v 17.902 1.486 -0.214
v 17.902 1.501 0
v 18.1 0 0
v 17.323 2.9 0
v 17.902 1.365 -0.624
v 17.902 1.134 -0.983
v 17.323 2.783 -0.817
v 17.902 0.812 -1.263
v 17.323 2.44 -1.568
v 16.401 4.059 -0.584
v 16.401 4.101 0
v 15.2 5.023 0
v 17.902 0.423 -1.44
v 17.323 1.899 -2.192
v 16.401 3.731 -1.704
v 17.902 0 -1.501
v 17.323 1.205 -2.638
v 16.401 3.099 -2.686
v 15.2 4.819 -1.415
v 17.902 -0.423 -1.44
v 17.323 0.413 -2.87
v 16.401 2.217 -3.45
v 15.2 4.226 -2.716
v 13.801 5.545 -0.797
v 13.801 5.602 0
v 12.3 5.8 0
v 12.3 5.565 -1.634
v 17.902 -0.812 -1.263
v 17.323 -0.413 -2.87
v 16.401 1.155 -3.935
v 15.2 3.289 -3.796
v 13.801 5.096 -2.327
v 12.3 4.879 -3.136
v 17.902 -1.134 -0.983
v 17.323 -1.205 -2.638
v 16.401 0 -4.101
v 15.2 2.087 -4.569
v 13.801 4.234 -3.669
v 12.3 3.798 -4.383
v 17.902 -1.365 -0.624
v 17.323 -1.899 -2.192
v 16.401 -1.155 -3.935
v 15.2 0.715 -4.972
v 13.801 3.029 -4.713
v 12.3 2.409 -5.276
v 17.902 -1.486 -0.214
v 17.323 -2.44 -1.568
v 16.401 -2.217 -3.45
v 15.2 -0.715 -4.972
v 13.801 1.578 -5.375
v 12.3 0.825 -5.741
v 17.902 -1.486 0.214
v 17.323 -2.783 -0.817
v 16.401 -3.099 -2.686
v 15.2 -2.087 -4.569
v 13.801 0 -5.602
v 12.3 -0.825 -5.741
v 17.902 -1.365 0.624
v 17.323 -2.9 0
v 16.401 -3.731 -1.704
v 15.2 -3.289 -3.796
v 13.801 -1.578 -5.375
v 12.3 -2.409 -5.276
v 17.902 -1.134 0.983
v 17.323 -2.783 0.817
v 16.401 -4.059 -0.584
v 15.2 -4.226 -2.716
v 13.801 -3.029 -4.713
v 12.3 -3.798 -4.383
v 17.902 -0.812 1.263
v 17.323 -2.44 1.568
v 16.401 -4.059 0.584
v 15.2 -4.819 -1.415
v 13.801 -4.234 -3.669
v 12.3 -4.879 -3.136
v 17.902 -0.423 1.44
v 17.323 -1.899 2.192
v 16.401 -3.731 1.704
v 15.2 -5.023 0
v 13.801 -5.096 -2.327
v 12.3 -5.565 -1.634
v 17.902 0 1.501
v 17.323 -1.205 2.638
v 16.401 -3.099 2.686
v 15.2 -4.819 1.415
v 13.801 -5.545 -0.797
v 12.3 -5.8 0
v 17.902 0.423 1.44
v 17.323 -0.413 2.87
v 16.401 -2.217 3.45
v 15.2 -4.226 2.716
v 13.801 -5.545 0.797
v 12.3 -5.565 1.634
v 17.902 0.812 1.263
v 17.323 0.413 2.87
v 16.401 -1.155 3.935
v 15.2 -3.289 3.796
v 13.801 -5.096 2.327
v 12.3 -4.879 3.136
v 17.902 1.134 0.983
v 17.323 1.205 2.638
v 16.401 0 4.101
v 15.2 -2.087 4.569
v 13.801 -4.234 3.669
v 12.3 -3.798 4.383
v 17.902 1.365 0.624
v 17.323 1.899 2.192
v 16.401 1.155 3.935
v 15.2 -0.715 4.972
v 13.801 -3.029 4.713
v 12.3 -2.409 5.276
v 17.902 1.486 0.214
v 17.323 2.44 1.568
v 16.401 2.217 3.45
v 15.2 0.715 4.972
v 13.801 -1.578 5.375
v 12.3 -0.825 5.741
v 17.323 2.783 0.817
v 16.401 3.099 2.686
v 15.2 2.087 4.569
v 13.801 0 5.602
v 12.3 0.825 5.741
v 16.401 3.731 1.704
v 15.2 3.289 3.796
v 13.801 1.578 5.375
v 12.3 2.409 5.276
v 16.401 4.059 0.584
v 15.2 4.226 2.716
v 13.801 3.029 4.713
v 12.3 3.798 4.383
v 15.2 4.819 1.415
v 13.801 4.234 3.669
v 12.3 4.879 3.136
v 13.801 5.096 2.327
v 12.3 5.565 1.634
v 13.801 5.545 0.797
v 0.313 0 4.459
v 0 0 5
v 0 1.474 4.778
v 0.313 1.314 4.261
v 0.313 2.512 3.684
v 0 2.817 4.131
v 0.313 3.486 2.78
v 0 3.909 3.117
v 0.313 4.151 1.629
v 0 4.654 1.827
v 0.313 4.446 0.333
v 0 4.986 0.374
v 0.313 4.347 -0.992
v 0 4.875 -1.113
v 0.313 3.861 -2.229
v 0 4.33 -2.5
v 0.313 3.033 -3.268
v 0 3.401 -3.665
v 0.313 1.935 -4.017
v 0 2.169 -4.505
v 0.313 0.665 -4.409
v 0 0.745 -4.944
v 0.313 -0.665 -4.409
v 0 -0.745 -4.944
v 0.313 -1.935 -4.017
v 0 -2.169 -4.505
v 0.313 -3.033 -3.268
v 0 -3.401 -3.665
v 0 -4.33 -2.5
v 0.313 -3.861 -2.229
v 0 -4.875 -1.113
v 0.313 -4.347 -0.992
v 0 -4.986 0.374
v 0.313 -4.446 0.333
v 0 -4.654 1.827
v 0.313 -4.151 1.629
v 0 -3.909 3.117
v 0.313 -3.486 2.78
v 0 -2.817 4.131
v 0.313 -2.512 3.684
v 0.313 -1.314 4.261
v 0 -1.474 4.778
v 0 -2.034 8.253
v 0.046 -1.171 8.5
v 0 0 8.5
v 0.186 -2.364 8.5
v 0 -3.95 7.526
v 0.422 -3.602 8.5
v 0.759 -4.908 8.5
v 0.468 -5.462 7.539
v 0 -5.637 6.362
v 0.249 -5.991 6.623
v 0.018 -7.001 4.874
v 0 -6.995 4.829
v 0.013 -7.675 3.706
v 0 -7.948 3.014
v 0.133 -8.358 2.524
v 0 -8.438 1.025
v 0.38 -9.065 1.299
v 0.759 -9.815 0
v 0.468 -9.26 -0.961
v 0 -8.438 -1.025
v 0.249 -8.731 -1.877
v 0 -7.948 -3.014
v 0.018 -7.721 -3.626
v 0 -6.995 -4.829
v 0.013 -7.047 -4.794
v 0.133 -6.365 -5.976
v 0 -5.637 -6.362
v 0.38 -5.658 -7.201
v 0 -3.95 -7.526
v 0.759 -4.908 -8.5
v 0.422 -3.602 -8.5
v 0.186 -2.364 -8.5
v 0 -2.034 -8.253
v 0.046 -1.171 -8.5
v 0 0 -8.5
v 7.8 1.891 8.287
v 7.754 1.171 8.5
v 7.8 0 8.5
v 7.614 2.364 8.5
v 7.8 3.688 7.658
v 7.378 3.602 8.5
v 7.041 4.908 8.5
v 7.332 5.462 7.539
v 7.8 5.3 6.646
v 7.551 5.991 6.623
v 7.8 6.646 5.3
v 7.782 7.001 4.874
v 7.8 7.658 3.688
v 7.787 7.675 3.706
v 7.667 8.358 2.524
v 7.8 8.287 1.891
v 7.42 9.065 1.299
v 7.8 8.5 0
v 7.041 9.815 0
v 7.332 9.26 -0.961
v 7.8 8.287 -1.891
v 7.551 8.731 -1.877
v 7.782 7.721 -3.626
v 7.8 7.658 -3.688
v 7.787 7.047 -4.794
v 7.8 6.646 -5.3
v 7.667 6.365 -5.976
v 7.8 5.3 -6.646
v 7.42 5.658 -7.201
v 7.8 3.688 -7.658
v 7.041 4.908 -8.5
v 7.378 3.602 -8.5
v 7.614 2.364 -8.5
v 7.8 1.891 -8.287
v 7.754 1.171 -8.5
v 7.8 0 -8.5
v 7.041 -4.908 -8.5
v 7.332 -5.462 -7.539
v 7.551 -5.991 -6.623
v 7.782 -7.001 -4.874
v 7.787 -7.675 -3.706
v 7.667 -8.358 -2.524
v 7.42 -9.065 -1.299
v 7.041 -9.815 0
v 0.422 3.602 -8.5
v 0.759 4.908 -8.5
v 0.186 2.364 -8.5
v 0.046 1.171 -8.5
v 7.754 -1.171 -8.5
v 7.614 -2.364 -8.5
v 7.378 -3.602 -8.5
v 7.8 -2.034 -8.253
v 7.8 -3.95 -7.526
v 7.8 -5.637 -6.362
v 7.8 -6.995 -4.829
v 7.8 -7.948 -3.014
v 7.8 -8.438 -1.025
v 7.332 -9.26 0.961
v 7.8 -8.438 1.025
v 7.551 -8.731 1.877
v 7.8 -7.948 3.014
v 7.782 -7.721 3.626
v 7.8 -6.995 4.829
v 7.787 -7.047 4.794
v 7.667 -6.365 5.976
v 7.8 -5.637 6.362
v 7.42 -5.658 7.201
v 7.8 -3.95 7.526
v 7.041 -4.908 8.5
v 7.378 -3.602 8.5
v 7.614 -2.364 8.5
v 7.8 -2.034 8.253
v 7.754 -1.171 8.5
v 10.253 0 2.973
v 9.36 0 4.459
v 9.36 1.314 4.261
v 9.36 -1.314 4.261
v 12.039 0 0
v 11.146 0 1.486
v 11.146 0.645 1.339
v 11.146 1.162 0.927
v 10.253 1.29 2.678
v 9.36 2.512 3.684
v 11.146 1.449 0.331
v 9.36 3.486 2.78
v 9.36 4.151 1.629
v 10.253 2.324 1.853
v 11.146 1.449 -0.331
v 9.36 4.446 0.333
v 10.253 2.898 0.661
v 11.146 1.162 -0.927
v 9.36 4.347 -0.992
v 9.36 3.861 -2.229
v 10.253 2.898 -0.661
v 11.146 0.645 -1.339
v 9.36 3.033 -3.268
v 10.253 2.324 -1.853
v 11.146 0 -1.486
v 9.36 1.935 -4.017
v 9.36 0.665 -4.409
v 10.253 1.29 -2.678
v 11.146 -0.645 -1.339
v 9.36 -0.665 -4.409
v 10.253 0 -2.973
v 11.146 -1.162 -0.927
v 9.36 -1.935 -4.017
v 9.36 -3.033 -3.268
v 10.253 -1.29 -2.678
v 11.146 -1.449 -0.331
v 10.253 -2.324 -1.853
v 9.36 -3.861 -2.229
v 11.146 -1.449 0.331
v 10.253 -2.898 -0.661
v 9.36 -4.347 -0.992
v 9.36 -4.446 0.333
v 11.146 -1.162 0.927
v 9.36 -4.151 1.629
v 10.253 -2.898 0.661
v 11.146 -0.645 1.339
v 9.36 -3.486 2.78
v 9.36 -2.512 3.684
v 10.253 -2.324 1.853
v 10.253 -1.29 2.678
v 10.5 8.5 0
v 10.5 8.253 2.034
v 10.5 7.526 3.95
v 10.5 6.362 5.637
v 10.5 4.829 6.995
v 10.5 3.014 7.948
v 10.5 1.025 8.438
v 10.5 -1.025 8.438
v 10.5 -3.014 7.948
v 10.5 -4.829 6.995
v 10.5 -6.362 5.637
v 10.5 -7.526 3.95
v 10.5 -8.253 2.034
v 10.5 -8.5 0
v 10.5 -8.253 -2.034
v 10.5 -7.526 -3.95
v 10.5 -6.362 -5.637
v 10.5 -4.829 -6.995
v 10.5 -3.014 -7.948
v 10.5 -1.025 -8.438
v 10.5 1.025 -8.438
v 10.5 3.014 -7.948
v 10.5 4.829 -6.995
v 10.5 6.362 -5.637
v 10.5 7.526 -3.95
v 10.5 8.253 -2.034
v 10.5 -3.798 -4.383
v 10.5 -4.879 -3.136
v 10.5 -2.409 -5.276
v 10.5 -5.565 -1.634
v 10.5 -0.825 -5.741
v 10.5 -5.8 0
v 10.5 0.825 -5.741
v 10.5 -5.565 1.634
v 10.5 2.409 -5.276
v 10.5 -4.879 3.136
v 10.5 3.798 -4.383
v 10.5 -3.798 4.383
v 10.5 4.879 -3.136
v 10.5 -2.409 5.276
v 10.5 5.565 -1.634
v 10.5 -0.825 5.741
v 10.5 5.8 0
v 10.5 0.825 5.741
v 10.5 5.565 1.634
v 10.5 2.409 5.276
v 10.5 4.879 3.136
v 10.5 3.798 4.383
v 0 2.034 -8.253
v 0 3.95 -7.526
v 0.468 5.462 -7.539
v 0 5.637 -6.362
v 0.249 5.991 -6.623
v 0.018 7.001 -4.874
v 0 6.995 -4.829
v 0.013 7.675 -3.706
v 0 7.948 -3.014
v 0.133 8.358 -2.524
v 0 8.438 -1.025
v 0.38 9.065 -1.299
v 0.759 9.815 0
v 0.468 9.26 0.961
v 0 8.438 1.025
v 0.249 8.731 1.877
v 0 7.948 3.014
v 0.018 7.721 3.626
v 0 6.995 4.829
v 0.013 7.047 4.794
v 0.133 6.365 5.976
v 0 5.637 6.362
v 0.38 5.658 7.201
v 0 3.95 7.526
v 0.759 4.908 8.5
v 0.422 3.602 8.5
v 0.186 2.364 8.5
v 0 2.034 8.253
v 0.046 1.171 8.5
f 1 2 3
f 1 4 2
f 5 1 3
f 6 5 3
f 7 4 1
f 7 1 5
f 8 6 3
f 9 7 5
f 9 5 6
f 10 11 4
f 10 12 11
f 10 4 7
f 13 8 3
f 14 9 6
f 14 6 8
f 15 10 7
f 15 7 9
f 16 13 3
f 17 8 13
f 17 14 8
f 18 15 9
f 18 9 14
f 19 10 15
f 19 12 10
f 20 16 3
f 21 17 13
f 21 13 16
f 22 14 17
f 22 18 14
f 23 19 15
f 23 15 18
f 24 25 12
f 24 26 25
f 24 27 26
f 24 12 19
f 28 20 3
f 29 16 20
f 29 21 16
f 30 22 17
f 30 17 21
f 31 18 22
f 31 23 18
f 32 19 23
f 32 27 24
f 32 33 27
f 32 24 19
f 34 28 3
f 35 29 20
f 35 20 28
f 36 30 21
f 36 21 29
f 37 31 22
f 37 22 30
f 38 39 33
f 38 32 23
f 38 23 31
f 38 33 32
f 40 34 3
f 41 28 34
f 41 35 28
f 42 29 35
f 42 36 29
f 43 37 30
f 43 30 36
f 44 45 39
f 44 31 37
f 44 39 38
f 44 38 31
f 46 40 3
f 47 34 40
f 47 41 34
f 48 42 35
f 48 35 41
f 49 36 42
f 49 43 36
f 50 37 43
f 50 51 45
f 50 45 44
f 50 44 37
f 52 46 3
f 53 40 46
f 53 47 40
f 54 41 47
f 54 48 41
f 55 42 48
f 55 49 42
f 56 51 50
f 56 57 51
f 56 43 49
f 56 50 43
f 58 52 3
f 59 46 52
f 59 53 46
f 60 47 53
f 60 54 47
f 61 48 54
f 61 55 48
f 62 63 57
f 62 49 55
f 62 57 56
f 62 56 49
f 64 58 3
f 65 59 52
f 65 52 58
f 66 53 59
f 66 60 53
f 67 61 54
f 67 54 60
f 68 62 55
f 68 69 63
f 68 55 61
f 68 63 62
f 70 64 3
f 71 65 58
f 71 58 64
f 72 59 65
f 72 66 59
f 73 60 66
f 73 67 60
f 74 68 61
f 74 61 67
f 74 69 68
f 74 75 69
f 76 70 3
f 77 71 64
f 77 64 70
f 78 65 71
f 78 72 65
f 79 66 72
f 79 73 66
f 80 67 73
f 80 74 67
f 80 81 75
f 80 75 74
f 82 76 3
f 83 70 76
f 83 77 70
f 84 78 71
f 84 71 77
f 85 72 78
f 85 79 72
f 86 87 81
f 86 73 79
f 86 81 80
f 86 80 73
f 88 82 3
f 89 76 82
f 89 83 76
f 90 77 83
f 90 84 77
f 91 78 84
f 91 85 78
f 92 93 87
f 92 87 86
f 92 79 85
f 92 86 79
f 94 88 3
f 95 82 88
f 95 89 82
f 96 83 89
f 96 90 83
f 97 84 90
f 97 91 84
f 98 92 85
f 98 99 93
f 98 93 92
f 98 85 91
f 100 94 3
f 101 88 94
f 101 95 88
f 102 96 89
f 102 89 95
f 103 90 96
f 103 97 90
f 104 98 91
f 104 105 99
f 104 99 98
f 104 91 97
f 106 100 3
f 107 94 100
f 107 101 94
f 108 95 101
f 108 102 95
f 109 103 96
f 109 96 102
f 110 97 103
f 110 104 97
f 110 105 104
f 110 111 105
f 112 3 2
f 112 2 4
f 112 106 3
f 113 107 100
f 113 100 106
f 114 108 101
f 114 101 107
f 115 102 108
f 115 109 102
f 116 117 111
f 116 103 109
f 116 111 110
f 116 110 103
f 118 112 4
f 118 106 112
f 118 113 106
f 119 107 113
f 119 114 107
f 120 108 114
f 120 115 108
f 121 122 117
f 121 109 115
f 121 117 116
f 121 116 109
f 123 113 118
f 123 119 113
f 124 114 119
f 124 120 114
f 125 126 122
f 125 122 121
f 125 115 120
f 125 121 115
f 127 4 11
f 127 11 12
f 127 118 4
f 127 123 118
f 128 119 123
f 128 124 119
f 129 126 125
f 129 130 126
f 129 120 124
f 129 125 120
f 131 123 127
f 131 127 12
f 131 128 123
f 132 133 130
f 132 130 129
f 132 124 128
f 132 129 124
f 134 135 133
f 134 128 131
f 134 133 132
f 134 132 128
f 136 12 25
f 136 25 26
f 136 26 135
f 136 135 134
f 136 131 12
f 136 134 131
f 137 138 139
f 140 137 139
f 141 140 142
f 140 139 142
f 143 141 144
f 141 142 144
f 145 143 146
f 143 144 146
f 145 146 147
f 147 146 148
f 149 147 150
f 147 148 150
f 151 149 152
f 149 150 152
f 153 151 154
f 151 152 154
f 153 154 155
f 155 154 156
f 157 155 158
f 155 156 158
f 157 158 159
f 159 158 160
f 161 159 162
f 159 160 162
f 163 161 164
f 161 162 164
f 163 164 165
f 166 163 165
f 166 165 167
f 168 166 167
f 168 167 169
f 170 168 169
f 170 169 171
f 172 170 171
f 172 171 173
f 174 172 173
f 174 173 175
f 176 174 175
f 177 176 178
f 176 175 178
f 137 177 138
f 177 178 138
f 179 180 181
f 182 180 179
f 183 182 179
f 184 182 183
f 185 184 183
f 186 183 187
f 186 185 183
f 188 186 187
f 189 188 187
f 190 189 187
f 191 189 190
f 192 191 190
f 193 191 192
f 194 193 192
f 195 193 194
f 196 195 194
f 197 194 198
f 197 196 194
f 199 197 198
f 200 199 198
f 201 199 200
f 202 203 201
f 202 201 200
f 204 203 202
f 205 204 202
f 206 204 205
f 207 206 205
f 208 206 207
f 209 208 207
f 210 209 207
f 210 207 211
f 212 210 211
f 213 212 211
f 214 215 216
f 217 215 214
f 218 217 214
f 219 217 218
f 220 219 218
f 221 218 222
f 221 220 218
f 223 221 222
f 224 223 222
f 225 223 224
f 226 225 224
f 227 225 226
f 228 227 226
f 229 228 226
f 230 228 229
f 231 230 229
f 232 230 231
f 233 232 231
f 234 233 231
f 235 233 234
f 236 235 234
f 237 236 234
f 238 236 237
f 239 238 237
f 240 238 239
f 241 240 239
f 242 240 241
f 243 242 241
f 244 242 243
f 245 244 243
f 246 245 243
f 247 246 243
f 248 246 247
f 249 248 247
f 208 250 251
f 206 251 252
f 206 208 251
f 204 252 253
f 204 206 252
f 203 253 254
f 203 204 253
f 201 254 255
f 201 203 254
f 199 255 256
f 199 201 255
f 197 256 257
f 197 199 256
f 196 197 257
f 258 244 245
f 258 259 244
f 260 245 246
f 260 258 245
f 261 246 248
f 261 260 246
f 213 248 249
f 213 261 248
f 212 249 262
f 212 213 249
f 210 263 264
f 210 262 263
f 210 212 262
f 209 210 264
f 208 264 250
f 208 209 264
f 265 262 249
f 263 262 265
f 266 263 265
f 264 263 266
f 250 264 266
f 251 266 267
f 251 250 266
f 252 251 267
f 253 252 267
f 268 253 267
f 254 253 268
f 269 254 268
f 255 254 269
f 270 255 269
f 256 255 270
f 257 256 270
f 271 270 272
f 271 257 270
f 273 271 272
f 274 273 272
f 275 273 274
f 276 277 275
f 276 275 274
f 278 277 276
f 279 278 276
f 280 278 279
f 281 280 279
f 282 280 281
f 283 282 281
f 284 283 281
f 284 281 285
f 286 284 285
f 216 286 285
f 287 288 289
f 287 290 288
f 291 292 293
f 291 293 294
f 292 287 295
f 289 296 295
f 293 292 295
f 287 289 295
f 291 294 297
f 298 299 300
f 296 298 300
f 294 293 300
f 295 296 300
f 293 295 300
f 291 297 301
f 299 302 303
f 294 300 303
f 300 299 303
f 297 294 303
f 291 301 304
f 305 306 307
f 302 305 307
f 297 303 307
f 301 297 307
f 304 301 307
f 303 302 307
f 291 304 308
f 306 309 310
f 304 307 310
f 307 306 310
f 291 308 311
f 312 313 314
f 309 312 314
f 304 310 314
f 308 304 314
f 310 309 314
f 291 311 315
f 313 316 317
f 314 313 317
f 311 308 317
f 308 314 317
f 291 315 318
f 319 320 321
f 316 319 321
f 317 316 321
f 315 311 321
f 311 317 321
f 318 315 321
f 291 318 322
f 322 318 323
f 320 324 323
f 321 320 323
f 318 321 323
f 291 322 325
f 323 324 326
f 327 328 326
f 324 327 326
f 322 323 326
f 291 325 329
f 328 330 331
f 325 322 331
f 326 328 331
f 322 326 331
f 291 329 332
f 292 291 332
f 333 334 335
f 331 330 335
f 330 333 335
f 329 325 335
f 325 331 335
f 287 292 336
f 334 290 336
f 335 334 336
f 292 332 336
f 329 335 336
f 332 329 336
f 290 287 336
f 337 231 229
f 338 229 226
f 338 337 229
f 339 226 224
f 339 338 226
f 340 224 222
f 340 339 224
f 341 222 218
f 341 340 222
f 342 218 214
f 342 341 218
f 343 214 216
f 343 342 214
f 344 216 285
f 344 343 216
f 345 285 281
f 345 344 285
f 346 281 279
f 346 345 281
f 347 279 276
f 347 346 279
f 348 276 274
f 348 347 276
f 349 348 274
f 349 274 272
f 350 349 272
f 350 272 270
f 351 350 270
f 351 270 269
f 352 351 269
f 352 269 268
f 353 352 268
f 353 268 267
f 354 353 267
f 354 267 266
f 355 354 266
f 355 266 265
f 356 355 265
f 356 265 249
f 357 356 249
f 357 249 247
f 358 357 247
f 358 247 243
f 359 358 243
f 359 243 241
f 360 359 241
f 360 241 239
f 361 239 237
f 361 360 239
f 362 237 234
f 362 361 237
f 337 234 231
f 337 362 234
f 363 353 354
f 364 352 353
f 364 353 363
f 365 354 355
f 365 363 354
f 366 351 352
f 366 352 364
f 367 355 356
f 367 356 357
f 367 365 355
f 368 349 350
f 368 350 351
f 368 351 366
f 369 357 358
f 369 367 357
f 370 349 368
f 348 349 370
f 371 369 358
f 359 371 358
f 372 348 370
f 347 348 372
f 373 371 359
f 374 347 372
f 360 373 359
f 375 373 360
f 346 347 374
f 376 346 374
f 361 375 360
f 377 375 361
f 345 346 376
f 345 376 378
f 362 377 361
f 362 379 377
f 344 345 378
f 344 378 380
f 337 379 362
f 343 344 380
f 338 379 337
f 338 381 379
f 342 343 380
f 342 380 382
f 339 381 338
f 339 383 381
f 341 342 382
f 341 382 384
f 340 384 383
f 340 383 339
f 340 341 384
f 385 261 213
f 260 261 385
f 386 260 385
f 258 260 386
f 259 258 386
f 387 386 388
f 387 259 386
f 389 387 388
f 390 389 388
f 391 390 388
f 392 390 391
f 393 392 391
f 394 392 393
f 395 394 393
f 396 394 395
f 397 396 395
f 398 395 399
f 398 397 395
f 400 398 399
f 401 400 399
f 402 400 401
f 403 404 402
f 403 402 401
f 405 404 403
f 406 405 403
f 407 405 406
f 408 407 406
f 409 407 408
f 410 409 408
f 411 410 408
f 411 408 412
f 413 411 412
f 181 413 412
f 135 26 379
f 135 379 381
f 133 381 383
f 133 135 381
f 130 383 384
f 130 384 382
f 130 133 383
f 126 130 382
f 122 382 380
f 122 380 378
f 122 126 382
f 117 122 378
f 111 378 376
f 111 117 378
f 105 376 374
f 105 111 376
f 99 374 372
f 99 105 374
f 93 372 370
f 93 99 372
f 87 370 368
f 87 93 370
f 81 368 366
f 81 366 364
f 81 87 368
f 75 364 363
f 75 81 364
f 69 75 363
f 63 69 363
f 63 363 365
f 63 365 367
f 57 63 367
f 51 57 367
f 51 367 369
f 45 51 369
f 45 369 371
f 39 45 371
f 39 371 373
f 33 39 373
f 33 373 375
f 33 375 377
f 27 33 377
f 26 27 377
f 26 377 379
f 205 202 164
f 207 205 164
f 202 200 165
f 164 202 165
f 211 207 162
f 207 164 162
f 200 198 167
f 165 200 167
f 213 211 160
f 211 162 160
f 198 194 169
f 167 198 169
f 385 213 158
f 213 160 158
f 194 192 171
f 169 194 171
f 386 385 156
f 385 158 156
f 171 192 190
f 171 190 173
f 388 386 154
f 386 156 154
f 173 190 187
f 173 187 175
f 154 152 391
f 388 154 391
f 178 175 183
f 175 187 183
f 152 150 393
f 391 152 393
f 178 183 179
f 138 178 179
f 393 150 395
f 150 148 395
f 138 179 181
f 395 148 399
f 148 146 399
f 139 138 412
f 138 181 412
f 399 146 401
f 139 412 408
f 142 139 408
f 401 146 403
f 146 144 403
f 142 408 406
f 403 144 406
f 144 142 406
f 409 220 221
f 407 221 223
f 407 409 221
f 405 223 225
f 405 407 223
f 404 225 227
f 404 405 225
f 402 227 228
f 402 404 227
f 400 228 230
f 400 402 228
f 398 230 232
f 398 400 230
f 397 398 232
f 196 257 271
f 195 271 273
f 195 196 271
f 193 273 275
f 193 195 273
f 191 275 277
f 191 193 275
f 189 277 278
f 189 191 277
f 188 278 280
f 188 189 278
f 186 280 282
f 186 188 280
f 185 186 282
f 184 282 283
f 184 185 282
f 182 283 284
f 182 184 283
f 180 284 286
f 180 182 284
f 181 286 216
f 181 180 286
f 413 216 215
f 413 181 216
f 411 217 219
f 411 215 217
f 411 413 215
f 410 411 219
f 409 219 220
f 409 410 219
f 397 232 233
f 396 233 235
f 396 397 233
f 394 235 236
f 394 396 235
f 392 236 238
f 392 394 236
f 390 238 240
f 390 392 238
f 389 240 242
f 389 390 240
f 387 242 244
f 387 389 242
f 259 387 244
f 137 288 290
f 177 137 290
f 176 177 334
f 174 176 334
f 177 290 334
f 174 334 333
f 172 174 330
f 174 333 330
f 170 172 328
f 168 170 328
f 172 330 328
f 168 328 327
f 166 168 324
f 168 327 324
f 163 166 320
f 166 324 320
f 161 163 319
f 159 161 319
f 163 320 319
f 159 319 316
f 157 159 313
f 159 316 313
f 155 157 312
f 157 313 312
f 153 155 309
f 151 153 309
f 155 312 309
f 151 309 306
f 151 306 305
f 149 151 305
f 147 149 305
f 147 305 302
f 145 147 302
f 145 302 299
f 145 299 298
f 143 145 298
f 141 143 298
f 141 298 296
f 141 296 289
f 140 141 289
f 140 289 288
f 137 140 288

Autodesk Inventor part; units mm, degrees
ref_plane "YZ Plane" through (0, 0, 0) normal (1, 0, 0) x (0, 1, 0)
ref_plane "XZ Plane" through (0, 0, 0) normal (0, 1, 0) x (-1, 0, 0)
sketch "Sketch1" plane through (0, 0, 0) normal (1, 0, 0) x (0, 1, 0)
  line L0 (-9.815, 0) -> (-4.9075, 8.5)
  line L1 (-4.9075, 8.5) -> (4.9075, 8.5)
  line L2 (4.9075, 8.5) -> (9.815, 0)
  line L3 (9.815, 0) -> (4.9075, -8.5)
  line L4 (4.9075, -8.5) -> (-4.9075, -8.5)
  line L5 (-4.9075, -8.5) -> (-9.815, 0)
  point P0 (0, 0)
  point P1 (0, 0)
  dimension "d0" = 19.6299
extrude "Body" add sketch "Sketch1" along normal blind 7.8
sketch "Sketch2" plane through (0, 0, 0) normal (0, 0, 1) x (1, 0, 0)
  line L0 (7.8, 8.5) -> (10.5, 8.5)
  line L1 (10.5, 8.5) -> (10.5, 5.8)
  line L2 (10.5, 5.8) -> (12.3, 5.8)
  arc A0 (18.1, 0) -> (12.3, 5.8) centre (12.3, 0) ccw
  line L3 (-3.8602, 0) -> (23.1615, 0) projected
  line L4 (0, -7.589) -> (0, 11.1815) projected
  line L5 (7.8, 0) -> (18.1, 0)
  line L6 (7.8, -4.9075) -> (7.8, 4.9075) projected
  line L7 (7.8, 0) -> (7.8, 8.5)
  point P0 (0, 0)
  dimension "d8" = 5.8
  dimension "d9" = 17
  dimension "d10" = 18.1
  dimension "d11" = 10.5
  dimension "d12" = 11.6
revolve "Cap" add sketch "Sketch2" angle 360 about axis through (7.8, 0, 0) along (1, 0, 0)
sketch "Sketch3" plane through (0, 0, 0) normal (-1, 0, 0) x (0, 0, 1)
  line L0 (0, -13.7409) -> (0, 13.7409) projected
  line L1 (-11.9, 0) -> (11.9, 0) projected
  point P0 (0, 0)
hole "Thread" at (0, 0, 0) direction (1, 0, 0) diameter 8.9175 depth 9.36 tip angle 118 thread size "M10x1" class "6H" standard "ISO Metric profile"
sketch "Sketch4" plane through (0, 0, 0) normal (0, 0, 1) x (1, 0, 0)
  line L0 (0, 4.9075) -> (0, 9.815) projected
  line L1 (0, 9.815) -> (7.8, 9.815) projected
  line L2 (7.8, 4.9075) -> (7.8, 9.815) projected
  line L3 (-1.56, 0) -> (9.36, 0) projected
  line L4 (0, 8.5) -> (0.7592, 9.815)
  line L5 (7.8, 8.5) -> (7.0408, 9.815)
  dimension "d3" = 30
  dimension "d4" = 17
  dimension "d5" = 30
  dimension "d6" = 17
revolve "Chamfer1" cut sketch "Sketch4" angle 360 about axis through (-10, 0, 0) along (1, 0, 0)
chamfer "Chamfer2" distance 0.5413 angle 30 1 edges at (0, 0, -4.4587) measured on face at (0, 7.111, -0.1791)
ref_plane "Work Plane1" through (4.68, 0, 0) normal (0, -0.866, 0.5) x (-1, 0, 0)
equation "\"d0\" = 1.1547 * SW"
equation "\"d1\" = GEL"
equation "\"d8\" = KR"
equation "\"d9\" = SW"
equation "\"d10\" = KOH1"
equation "\"d11\" = SIH"
equation "\"d12\" = 2 * KR"
equation "\"d13\" = GEL"
equation "\"d14\" = 1.2 * GEL"
equation "\"d3\" = ANG1"
equation "\"d4\" = SW0"
equation "\"d5\" = ANG2"
equation "\"d6\" = SW"
equation "\"d17\" = -0.5 * GD1 + 0.5 * NND"
equation "\"d45\" = -0.5 * GD1 + 0.5 * NND"
equation "\"ANG1\" = 30deg"
equation "\"ANG2\" = 30deg"
equation "\"KOH1\" = 18.1"
equation "\"SW\" = 17"
equation "\"KR\" = 5.8"
equation "\"SIH\" = 10.5"
equation "\"GEL\" = 7.8"
equation "\"SW0\" = 17"
equation "\"GUL\" = 0.541266 * PTC"
equation "\"XKOH\" = 10.5"
equation "\"PTC\" = 1"
equation "\"TOA\" = 30deg"
equation "\"KOH0\" = 7.8"
equation "\"E0\" = 19.635"
equation "\"GAL\" = 0.541266 * PTC"
equation "\"GD1\" = 8.917468"
equation "\"NND\" = 10"
properties part number "CNS 4315 - M 10" material "Steel, Mild"
